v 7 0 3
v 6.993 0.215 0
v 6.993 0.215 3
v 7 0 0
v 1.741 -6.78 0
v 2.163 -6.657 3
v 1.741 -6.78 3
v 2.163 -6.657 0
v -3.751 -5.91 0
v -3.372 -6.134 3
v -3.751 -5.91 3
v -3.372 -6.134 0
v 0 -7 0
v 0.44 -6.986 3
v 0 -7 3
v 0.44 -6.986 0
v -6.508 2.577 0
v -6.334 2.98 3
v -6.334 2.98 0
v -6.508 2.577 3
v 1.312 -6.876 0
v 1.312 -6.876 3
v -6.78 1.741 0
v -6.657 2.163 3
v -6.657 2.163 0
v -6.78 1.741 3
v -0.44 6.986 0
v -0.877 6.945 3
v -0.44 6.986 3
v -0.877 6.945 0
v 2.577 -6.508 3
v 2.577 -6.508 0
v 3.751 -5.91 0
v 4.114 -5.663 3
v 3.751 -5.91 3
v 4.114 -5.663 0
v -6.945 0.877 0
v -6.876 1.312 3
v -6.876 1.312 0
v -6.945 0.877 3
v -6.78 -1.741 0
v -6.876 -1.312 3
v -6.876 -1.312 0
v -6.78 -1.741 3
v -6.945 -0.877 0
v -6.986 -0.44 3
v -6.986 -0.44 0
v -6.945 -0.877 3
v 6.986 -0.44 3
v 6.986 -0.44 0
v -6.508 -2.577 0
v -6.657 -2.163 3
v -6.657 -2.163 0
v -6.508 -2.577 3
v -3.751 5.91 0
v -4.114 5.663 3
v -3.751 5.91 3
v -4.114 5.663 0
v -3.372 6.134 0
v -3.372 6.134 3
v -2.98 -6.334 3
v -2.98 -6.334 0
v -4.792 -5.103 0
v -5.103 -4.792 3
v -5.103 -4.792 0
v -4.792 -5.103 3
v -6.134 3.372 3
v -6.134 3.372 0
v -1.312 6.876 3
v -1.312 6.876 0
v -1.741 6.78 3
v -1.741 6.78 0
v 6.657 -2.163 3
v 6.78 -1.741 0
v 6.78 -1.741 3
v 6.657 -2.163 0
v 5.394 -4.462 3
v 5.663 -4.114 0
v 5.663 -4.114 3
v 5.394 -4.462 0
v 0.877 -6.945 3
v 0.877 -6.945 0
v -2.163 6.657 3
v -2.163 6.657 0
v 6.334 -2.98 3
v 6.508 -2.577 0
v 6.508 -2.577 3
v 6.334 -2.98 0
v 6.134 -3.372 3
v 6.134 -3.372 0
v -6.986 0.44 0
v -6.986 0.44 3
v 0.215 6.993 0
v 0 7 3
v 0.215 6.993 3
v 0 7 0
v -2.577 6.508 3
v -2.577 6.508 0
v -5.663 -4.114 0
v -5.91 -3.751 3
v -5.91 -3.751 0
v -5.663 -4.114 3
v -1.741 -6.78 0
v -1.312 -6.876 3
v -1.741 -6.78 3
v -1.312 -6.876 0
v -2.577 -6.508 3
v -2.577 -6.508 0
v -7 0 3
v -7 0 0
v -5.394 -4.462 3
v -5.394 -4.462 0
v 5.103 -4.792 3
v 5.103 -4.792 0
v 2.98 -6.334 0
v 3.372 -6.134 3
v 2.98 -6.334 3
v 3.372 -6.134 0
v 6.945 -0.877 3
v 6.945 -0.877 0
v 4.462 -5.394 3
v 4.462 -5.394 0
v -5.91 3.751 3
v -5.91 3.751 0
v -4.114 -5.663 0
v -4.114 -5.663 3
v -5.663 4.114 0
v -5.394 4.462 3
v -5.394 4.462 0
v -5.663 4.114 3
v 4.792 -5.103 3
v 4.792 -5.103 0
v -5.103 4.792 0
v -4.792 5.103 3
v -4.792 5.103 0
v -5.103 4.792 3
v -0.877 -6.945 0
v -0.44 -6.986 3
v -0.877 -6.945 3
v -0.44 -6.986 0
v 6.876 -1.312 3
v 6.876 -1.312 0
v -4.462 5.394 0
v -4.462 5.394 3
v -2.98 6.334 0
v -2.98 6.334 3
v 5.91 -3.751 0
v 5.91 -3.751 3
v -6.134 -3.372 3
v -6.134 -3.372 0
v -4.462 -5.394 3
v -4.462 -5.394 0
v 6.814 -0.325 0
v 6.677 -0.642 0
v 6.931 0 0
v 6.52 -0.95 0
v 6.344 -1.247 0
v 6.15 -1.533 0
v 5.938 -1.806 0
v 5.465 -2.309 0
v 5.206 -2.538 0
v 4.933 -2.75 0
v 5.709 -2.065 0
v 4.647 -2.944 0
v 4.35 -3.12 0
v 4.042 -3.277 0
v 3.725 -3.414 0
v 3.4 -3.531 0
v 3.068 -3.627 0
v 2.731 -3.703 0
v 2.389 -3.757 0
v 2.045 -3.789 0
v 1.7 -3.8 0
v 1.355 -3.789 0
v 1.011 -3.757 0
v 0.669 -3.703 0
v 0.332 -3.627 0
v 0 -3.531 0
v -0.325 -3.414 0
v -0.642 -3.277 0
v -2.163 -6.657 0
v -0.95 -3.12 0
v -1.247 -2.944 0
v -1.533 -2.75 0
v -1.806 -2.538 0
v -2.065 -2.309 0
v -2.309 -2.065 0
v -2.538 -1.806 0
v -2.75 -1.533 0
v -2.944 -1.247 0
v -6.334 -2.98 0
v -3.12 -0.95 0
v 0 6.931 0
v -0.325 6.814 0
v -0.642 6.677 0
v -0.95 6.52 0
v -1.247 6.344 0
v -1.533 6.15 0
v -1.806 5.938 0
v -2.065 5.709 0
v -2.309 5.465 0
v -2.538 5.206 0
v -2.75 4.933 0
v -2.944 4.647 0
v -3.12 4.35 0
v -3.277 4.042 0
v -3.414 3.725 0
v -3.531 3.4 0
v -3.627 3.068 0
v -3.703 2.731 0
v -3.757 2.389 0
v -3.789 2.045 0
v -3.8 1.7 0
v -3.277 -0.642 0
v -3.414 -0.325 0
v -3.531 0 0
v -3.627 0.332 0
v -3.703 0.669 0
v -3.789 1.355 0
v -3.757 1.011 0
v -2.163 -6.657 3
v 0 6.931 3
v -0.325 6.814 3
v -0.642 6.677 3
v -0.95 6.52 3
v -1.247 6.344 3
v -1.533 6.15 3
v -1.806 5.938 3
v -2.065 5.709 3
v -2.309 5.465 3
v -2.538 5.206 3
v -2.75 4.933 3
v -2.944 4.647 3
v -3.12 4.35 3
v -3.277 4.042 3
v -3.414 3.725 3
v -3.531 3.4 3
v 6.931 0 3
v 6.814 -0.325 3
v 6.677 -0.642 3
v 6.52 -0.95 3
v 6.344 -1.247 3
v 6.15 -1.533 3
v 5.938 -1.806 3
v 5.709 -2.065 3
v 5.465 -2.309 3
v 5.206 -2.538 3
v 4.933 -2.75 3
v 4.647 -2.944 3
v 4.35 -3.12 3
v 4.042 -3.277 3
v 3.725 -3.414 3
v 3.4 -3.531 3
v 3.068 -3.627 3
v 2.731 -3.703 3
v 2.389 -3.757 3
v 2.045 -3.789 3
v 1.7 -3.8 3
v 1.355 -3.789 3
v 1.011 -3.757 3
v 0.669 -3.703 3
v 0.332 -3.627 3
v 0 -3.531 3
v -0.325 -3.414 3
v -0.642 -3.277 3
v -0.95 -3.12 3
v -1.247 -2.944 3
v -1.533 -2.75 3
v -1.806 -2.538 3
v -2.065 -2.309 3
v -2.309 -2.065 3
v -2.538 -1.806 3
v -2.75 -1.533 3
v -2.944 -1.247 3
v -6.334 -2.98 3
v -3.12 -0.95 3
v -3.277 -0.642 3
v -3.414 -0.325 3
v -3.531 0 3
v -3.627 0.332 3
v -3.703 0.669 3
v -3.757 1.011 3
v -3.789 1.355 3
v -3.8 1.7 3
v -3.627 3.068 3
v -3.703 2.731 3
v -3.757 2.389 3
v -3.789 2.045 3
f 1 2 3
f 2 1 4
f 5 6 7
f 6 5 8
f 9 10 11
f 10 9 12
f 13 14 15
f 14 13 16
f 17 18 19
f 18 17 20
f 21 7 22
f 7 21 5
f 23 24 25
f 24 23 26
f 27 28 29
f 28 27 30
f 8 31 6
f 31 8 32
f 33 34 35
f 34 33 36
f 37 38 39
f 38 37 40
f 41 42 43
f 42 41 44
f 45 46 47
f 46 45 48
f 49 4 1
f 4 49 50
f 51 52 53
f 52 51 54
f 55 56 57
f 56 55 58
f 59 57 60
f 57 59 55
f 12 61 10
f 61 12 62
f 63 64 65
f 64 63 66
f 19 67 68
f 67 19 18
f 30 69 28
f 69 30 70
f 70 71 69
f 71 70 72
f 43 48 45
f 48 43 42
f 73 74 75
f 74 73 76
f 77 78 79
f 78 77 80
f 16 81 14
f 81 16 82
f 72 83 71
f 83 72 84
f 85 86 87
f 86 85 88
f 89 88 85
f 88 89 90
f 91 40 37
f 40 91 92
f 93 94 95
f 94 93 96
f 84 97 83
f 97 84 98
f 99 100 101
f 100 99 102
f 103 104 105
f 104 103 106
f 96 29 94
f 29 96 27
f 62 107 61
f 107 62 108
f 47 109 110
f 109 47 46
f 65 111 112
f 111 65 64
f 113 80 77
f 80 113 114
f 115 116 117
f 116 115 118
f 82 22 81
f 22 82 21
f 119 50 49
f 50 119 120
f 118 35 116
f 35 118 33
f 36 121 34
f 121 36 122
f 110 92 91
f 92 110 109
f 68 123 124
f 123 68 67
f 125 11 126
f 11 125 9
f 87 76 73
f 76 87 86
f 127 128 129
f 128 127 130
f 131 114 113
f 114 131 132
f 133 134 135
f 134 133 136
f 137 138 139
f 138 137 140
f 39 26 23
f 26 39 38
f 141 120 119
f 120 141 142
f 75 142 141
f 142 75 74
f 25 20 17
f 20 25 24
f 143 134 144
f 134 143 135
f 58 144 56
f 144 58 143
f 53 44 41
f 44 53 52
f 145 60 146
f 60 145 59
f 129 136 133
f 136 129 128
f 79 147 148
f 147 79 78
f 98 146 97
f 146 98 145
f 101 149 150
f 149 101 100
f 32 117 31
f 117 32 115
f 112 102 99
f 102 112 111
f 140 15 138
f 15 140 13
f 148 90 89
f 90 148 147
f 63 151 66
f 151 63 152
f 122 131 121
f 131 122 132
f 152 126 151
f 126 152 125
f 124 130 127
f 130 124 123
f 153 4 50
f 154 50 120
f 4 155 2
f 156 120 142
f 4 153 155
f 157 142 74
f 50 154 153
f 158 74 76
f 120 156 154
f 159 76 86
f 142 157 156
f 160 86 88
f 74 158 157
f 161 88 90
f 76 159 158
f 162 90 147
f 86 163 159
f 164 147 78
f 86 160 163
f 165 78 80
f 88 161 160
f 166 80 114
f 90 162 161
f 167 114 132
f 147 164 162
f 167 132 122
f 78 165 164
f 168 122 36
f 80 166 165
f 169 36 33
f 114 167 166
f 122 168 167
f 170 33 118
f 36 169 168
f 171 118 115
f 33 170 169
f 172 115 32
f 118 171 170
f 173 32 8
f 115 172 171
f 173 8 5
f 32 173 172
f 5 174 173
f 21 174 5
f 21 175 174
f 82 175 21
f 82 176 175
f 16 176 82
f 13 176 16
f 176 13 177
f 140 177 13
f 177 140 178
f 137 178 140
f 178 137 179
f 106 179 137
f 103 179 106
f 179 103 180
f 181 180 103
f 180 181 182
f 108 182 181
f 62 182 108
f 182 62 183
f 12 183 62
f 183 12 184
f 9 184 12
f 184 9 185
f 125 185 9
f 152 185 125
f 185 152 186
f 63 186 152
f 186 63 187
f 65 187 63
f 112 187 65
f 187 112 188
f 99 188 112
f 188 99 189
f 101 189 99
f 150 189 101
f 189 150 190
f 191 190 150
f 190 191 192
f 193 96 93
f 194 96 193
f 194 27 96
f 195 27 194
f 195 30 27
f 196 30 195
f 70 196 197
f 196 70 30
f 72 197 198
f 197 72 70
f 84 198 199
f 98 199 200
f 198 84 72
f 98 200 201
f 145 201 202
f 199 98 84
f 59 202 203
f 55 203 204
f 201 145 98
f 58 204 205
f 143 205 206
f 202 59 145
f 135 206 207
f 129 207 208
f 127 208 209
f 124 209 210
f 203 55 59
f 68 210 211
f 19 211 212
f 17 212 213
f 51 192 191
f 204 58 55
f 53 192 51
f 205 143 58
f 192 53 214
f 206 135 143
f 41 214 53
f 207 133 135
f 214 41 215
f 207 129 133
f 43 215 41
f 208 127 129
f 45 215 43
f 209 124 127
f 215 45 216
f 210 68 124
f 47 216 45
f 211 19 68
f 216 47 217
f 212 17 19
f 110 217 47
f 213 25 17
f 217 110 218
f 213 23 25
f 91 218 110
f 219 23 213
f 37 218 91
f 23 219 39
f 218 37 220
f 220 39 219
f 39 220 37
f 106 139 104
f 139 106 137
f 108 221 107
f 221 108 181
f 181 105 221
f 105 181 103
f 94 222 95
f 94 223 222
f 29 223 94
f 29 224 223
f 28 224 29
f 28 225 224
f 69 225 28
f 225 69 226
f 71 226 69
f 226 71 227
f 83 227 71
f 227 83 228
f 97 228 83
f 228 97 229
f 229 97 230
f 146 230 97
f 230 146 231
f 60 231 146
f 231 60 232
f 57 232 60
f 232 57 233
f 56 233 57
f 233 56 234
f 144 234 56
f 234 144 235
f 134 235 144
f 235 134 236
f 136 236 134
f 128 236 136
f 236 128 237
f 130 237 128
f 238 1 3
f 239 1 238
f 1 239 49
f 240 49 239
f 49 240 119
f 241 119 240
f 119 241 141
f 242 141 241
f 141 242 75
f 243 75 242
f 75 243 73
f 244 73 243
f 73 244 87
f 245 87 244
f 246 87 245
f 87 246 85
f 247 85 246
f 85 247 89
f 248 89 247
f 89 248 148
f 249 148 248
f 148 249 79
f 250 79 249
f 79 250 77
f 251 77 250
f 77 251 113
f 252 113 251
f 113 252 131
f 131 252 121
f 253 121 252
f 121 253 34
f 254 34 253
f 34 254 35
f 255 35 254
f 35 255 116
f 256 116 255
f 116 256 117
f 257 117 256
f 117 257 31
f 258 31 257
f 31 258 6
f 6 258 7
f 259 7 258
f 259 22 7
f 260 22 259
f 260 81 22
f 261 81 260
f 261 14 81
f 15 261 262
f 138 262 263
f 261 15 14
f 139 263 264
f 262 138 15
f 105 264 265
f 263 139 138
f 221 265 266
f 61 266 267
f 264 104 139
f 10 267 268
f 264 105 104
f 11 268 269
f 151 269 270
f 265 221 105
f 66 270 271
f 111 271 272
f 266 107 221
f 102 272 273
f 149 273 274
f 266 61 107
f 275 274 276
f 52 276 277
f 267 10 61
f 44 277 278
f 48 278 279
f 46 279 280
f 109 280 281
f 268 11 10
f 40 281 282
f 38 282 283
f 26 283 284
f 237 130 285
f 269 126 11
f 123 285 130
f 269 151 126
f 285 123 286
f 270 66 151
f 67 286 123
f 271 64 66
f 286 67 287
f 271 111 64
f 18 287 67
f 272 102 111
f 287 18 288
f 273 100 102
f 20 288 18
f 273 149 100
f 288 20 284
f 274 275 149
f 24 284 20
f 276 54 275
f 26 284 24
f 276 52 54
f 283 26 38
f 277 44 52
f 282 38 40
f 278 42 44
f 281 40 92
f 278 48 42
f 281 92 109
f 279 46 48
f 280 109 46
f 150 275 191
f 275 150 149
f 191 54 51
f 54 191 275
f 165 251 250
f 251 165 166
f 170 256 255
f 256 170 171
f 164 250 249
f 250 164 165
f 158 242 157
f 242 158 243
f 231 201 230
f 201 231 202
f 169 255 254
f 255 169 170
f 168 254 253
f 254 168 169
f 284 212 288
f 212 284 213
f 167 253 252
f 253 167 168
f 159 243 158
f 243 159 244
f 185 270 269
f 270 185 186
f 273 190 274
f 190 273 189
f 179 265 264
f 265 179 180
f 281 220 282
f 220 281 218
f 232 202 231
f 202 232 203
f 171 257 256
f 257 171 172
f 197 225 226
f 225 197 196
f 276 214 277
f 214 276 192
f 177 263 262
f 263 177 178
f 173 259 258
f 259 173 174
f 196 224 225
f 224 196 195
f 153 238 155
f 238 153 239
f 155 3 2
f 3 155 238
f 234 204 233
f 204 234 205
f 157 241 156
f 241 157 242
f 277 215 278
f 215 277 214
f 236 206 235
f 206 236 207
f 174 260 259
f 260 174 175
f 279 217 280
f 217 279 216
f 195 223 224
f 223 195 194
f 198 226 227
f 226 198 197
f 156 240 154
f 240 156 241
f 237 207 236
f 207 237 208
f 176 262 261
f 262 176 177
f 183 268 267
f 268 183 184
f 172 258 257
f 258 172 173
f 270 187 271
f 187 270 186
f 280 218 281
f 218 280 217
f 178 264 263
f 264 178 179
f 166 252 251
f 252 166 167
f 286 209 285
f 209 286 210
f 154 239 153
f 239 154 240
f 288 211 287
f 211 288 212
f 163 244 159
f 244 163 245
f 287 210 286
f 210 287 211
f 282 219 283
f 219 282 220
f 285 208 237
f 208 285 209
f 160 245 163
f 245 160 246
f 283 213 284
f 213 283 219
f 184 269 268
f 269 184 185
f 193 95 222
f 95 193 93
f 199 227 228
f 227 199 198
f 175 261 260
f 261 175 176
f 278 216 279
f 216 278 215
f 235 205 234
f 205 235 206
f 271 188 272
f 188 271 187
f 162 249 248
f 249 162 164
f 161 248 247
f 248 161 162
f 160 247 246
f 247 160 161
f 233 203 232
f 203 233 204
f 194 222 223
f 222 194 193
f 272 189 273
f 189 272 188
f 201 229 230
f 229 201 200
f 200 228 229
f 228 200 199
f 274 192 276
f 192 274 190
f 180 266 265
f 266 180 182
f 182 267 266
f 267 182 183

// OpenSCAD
$fn = 100;

crescentMoon();

module crescentMoon(height = 3)
{    
    difference()
    {
        cylinder(r=7, h=height);
        
        xyTranslate = 1.7;
        radius = 5.5;
        translate([xyTranslate, xyTranslate, -1])
        cylinder(r=radius, h=height+2);
    }
}
